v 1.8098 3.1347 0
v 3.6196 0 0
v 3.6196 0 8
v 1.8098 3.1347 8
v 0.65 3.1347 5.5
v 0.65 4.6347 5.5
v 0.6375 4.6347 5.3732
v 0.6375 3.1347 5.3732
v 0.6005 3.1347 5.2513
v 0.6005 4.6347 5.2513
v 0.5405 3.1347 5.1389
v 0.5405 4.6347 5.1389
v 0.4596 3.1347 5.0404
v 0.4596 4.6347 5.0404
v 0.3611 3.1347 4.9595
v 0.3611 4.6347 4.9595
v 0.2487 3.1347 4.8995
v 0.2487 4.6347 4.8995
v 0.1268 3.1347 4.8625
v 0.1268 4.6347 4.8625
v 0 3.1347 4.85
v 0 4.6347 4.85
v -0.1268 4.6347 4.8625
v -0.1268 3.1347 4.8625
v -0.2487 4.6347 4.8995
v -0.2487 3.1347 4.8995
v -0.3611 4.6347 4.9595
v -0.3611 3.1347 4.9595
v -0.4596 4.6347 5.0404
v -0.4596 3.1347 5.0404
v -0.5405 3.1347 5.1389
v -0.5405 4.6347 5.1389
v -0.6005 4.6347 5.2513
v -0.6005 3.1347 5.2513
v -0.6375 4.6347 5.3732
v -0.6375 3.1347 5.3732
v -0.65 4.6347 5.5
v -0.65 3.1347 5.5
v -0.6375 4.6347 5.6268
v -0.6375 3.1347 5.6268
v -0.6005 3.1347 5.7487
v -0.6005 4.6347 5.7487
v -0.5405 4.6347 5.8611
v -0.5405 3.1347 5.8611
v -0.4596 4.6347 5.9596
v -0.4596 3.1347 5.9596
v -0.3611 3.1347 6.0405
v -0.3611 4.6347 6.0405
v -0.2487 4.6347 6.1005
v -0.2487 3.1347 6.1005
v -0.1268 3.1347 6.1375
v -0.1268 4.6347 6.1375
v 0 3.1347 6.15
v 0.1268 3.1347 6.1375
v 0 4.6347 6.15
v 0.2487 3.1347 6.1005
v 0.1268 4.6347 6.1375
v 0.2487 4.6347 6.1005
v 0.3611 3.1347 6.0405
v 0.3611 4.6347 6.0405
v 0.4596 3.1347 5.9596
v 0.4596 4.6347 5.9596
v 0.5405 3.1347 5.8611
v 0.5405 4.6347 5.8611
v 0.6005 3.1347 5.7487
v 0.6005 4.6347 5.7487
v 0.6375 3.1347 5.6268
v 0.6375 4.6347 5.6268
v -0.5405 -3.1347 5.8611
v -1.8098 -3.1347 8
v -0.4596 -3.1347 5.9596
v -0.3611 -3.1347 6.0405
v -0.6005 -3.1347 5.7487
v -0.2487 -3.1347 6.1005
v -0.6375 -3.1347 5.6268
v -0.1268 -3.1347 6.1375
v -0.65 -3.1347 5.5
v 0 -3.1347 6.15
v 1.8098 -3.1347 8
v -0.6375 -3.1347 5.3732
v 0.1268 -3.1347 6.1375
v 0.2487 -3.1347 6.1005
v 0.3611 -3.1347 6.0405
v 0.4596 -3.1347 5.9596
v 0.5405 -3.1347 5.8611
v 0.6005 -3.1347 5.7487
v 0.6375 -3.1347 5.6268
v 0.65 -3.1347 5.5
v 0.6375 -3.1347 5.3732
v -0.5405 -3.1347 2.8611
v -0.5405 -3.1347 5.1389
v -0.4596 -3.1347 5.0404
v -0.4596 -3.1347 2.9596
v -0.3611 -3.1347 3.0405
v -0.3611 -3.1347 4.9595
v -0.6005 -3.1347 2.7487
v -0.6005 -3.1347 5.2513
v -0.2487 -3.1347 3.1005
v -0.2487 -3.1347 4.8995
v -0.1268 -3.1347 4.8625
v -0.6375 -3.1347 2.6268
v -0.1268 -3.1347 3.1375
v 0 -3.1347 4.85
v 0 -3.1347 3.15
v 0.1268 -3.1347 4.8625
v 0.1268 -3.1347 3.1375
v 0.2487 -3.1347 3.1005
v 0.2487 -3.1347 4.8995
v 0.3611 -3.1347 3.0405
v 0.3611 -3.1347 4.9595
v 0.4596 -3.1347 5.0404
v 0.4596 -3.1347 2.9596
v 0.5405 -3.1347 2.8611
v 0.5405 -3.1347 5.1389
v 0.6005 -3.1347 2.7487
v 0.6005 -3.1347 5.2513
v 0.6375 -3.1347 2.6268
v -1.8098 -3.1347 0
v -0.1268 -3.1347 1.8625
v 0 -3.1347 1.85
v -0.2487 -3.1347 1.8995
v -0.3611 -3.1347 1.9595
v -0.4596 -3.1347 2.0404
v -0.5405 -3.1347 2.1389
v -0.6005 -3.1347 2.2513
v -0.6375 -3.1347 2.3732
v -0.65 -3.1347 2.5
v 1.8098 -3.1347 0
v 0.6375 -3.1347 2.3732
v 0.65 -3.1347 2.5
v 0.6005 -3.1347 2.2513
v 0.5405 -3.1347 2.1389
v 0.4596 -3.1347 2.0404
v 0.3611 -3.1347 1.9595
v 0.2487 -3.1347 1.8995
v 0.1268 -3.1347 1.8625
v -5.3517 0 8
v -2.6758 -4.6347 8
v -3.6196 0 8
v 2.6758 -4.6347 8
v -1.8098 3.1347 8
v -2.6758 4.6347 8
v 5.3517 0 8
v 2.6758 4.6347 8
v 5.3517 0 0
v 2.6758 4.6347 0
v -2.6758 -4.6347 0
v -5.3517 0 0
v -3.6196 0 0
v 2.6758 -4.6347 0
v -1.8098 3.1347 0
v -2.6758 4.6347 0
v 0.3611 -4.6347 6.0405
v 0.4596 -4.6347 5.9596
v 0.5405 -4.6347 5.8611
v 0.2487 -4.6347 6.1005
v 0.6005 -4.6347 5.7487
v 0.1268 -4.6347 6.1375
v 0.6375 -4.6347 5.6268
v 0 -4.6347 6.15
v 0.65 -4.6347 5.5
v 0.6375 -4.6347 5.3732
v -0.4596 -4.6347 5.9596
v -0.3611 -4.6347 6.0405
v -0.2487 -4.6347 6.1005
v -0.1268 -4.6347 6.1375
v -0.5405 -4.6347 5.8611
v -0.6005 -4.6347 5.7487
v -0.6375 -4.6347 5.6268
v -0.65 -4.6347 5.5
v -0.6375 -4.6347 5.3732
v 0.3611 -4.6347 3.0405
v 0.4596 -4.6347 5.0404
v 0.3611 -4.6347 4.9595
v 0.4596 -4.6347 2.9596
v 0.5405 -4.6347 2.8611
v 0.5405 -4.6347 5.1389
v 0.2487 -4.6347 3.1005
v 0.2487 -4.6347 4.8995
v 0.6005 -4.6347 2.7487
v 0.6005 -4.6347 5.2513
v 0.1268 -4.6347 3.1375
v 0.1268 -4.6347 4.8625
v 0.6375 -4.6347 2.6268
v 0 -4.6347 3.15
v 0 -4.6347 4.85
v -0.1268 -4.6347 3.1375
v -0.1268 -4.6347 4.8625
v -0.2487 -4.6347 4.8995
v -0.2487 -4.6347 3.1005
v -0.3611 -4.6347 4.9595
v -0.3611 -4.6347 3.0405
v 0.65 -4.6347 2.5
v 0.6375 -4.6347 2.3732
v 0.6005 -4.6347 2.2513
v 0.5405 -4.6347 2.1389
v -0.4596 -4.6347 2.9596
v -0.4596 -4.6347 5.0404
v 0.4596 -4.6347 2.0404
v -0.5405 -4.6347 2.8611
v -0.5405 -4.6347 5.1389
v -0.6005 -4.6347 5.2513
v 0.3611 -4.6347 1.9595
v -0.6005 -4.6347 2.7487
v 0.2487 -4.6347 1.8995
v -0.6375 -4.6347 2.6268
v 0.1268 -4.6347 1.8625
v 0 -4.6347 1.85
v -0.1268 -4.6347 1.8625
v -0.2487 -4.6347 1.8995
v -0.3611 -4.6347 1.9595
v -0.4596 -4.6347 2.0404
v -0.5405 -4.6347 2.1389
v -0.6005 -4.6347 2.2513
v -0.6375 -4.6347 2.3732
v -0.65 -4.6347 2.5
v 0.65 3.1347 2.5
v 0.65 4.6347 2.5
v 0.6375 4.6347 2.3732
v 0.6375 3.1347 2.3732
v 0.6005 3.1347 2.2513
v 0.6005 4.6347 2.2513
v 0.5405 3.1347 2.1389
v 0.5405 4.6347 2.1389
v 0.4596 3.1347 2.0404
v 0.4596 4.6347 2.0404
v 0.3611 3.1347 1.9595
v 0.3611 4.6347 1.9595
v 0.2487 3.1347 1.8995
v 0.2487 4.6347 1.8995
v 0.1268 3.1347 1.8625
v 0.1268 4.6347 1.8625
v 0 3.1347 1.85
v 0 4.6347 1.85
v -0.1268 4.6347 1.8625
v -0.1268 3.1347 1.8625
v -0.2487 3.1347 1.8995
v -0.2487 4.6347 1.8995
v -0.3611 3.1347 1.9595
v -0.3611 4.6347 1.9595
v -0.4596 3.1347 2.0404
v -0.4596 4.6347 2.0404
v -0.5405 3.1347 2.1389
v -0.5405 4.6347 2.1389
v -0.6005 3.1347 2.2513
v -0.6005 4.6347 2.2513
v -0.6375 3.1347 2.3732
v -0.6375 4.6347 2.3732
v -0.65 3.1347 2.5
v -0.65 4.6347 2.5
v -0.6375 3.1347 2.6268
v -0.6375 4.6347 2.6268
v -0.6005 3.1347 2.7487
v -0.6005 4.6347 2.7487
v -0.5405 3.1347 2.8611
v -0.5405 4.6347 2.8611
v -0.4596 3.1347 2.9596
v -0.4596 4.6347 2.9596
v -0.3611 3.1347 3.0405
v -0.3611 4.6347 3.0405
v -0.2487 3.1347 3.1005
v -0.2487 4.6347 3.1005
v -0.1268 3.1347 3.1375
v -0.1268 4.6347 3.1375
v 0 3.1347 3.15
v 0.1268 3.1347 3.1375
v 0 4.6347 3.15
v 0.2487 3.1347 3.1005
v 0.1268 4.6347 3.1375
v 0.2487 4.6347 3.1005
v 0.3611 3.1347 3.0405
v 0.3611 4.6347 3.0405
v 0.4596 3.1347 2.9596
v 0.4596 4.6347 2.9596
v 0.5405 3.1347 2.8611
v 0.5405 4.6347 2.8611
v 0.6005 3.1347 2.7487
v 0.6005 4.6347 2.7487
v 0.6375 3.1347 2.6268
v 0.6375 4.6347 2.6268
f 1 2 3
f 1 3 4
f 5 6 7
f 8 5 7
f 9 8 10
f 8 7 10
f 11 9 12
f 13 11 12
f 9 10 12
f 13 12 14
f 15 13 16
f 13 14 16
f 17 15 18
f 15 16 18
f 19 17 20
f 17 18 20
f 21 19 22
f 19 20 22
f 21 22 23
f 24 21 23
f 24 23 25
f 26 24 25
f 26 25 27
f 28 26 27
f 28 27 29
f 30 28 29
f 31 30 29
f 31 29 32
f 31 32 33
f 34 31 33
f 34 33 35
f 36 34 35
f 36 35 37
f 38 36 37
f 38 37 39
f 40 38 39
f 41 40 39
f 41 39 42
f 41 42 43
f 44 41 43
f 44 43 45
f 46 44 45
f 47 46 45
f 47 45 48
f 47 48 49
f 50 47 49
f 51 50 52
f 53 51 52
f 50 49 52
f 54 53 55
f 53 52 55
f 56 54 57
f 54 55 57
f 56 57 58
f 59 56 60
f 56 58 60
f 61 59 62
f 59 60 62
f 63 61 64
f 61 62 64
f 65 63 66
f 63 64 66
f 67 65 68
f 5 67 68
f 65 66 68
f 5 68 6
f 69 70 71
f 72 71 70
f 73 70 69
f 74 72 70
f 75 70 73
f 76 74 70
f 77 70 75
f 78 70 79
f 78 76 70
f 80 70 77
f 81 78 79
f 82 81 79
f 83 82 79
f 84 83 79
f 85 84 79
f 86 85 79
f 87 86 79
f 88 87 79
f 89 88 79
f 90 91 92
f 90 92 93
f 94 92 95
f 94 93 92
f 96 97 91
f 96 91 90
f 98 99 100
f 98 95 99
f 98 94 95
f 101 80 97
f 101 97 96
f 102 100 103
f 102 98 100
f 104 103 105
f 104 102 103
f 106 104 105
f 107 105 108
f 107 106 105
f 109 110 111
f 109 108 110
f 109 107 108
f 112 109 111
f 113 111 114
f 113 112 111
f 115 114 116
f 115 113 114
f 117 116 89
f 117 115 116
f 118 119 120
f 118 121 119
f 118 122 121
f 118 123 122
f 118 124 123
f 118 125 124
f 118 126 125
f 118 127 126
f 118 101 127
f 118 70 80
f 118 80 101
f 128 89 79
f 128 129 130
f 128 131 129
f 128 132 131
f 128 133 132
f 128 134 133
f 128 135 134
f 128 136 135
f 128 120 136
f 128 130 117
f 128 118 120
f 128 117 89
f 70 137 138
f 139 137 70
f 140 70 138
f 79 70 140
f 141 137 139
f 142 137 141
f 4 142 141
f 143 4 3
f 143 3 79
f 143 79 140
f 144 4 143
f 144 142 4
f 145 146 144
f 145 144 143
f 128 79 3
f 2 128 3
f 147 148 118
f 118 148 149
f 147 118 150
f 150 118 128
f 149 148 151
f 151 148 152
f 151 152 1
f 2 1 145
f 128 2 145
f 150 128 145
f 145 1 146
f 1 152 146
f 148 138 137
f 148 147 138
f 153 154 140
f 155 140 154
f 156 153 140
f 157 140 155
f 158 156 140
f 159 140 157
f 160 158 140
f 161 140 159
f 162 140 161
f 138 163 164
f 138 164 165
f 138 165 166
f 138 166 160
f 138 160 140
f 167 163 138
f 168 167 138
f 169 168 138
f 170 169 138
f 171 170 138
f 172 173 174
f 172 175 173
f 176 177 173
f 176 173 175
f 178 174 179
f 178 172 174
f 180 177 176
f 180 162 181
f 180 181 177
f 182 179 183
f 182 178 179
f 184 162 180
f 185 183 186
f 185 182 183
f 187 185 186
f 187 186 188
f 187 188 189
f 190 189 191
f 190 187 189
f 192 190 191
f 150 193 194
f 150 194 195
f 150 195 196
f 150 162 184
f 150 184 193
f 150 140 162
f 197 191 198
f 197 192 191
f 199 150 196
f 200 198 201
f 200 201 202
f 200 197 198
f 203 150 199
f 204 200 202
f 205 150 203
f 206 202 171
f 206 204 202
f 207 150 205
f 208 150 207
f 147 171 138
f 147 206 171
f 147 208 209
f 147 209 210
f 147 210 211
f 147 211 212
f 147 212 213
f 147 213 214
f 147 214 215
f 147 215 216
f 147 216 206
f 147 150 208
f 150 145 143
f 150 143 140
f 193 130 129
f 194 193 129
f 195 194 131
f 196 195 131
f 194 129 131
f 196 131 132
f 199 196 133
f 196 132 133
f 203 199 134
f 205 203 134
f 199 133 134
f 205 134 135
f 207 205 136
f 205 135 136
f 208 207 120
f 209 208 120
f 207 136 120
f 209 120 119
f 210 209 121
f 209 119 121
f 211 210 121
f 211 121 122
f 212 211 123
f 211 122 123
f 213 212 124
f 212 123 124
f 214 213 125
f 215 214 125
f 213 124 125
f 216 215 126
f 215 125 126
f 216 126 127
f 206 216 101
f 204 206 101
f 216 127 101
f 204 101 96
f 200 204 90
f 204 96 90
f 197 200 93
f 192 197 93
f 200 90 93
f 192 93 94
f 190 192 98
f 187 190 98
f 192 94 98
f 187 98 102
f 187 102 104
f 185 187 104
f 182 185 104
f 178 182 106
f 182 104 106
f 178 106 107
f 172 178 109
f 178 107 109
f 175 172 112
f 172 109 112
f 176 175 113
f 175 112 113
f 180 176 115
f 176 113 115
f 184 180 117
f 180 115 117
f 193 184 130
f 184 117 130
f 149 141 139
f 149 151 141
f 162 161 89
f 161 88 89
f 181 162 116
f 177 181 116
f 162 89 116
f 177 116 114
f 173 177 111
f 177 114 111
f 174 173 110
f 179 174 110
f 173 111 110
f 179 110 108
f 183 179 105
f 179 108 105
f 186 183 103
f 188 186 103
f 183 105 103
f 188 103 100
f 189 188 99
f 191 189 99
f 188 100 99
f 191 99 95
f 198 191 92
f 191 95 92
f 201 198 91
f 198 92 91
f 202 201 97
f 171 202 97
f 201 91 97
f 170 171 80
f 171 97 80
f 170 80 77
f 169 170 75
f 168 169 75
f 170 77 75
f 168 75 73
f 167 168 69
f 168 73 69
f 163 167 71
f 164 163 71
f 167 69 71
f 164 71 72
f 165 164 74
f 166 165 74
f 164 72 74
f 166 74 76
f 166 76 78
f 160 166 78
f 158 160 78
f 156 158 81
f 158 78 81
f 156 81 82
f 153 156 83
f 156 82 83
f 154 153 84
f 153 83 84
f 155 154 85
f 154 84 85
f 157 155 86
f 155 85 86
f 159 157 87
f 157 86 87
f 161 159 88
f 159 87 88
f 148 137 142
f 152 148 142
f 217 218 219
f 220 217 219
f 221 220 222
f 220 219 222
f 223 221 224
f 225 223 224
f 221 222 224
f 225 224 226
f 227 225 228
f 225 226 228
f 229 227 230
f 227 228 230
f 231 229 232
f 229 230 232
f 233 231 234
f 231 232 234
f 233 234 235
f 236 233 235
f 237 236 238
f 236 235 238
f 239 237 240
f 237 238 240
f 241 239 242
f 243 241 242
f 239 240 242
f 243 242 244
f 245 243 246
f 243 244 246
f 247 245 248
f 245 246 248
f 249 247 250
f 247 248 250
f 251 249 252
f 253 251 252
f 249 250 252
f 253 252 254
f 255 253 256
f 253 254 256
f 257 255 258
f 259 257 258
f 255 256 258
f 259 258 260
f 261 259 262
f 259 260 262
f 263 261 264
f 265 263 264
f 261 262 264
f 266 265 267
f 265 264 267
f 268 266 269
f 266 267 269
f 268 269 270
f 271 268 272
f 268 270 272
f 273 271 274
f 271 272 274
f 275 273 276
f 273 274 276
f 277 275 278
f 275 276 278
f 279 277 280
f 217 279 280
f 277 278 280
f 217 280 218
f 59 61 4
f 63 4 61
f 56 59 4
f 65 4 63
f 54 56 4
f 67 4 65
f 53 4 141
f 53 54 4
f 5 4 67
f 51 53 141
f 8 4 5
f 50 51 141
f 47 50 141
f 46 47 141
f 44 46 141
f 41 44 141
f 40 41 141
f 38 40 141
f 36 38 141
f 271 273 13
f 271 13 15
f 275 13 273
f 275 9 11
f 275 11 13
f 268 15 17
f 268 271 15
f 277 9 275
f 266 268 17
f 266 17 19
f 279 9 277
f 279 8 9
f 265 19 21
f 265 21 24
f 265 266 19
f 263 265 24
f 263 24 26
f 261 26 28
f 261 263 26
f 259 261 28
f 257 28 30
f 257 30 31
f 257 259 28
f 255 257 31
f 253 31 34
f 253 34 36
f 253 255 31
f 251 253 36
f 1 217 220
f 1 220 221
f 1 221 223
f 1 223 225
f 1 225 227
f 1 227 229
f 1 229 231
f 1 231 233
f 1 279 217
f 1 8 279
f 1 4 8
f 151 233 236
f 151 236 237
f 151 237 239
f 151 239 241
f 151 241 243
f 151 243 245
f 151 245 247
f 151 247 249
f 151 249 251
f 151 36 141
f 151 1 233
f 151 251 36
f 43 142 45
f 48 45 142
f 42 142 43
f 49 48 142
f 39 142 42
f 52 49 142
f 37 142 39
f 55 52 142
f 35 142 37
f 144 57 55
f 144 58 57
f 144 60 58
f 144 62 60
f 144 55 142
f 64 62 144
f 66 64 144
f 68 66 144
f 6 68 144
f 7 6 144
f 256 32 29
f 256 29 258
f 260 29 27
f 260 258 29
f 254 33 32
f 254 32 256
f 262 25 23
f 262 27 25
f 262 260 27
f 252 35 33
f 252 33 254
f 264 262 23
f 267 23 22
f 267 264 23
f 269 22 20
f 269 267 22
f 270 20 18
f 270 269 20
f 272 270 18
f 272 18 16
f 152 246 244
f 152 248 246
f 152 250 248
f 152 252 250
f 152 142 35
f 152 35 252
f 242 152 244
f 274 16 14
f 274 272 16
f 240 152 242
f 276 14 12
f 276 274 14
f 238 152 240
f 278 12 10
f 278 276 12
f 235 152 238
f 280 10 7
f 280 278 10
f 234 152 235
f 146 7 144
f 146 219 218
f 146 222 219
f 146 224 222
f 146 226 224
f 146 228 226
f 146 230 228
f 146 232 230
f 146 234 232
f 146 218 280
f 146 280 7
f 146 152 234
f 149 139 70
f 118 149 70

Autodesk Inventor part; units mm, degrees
ref_plane "YZ Plane" through (0, 0, 0) normal (1, 0, 0) x (0, 1, 0)
ref_plane "XZ Plane" through (0, 0, 0) normal (0, 1, 0) x (-1, 0, 0)
ref_plane "XY Plane" through (0, 0, 0) normal (0, 0, 1) x (1, 0, 0)
sketch "Sketch4" plane through (0, 0, 0) normal (0, 0, 1) x (1, 0, 0)
  circle A0 centre (0, 0) radius 3.1 construction
  line L0 (0, 0) -> (3.1, 0) construction
  line L1 (0, 0) -> (1.55, 2.6847) construction
  line L2 (0, 0) -> (-1.55, 2.6847) construction
  line L3 (0, 0) -> (-3.1, 0) construction
  line L4 (0, 0) -> (-1.55, -2.6847) construction
  line L5 (0, 0) -> (1.55, -2.6847) construction
  line L6 (-1.55, 2.6847) -> (1.55, 2.6847) construction
  line L7 (1.55, 2.6847) -> (3.1, 0) construction
  line L8 (3.1, 0) -> (1.55, -2.6847) construction
  line L9 (1.55, -2.6847) -> (-1.55, -2.6847) construction
  line L10 (-1.55, -2.6847) -> (-3.1, 0) construction
  line L11 (-3.1, 0) -> (-1.55, 2.6847) construction
  line L12 (3.6196, 0) -> (1.8098, 3.1347)
  line L13 (1.8098, 3.1347) -> (-1.8098, 3.1347)
  line L14 (-1.8098, 3.1347) -> (-3.6196, 0)
  line L15 (-3.6196, 0) -> (-1.8098, -3.1347)
  line L16 (-1.8098, -3.1347) -> (1.8098, -3.1347)
  line L17 (1.8098, -3.1347) -> (3.6196, 0)
  line L18 (2.6758, 4.6347) -> (5.3517, 0)
  line L19 (5.3517, 0) -> (2.6758, -4.6347)
  line L20 (2.6758, -4.6347) -> (-2.6758, -4.6347)
  line L21 (-2.6758, -4.6347) -> (-5.3517, 0)
  line L22 (-5.3517, 0) -> (-2.6758, 4.6347)
  line L23 (-2.6758, 4.6347) -> (2.6758, 4.6347)
  dimension "d8" = 6.2
  dimension "d11" = 360
  dimension "d13" = 0.45
  dimension "d14" = 1.5
extrude "Extrusion3" add sketch "Sketch4" along normal blind 8
sketch "Sketch5" plane through (-2.6758, 4.6347, 0) normal (0, 1, 0) x (1, 0, 0)
  line L0 (5.3517, 0) -> (0, 0) projected
  line L1 (0, 0) -> (0, -8) projected
  line L2 (5.3517, -8) -> (0, -8) projected
  line L3 (5.3517, 0) -> (5.3517, -8) projected
  circle A0 centre (2.6758, -5.5) radius 0.65
  circle A1 centre (2.6758, -2.5) radius 0.65
  line L4 (5.3517, -8) -> (0, -8) projected
  point P0 (2.6758, 0)
  point P1 (2.6758, -8)
  point P2 (2.6758, -8)
  dimension "d17" = 1.3
  dimension "d18" = 2.5
  dimension "d19" = 2.5
extrude "Extrusion4" cut sketch "Sketch5" against normal blind 10 contours A0 | A1
properties part number "hombro_nuevo"
